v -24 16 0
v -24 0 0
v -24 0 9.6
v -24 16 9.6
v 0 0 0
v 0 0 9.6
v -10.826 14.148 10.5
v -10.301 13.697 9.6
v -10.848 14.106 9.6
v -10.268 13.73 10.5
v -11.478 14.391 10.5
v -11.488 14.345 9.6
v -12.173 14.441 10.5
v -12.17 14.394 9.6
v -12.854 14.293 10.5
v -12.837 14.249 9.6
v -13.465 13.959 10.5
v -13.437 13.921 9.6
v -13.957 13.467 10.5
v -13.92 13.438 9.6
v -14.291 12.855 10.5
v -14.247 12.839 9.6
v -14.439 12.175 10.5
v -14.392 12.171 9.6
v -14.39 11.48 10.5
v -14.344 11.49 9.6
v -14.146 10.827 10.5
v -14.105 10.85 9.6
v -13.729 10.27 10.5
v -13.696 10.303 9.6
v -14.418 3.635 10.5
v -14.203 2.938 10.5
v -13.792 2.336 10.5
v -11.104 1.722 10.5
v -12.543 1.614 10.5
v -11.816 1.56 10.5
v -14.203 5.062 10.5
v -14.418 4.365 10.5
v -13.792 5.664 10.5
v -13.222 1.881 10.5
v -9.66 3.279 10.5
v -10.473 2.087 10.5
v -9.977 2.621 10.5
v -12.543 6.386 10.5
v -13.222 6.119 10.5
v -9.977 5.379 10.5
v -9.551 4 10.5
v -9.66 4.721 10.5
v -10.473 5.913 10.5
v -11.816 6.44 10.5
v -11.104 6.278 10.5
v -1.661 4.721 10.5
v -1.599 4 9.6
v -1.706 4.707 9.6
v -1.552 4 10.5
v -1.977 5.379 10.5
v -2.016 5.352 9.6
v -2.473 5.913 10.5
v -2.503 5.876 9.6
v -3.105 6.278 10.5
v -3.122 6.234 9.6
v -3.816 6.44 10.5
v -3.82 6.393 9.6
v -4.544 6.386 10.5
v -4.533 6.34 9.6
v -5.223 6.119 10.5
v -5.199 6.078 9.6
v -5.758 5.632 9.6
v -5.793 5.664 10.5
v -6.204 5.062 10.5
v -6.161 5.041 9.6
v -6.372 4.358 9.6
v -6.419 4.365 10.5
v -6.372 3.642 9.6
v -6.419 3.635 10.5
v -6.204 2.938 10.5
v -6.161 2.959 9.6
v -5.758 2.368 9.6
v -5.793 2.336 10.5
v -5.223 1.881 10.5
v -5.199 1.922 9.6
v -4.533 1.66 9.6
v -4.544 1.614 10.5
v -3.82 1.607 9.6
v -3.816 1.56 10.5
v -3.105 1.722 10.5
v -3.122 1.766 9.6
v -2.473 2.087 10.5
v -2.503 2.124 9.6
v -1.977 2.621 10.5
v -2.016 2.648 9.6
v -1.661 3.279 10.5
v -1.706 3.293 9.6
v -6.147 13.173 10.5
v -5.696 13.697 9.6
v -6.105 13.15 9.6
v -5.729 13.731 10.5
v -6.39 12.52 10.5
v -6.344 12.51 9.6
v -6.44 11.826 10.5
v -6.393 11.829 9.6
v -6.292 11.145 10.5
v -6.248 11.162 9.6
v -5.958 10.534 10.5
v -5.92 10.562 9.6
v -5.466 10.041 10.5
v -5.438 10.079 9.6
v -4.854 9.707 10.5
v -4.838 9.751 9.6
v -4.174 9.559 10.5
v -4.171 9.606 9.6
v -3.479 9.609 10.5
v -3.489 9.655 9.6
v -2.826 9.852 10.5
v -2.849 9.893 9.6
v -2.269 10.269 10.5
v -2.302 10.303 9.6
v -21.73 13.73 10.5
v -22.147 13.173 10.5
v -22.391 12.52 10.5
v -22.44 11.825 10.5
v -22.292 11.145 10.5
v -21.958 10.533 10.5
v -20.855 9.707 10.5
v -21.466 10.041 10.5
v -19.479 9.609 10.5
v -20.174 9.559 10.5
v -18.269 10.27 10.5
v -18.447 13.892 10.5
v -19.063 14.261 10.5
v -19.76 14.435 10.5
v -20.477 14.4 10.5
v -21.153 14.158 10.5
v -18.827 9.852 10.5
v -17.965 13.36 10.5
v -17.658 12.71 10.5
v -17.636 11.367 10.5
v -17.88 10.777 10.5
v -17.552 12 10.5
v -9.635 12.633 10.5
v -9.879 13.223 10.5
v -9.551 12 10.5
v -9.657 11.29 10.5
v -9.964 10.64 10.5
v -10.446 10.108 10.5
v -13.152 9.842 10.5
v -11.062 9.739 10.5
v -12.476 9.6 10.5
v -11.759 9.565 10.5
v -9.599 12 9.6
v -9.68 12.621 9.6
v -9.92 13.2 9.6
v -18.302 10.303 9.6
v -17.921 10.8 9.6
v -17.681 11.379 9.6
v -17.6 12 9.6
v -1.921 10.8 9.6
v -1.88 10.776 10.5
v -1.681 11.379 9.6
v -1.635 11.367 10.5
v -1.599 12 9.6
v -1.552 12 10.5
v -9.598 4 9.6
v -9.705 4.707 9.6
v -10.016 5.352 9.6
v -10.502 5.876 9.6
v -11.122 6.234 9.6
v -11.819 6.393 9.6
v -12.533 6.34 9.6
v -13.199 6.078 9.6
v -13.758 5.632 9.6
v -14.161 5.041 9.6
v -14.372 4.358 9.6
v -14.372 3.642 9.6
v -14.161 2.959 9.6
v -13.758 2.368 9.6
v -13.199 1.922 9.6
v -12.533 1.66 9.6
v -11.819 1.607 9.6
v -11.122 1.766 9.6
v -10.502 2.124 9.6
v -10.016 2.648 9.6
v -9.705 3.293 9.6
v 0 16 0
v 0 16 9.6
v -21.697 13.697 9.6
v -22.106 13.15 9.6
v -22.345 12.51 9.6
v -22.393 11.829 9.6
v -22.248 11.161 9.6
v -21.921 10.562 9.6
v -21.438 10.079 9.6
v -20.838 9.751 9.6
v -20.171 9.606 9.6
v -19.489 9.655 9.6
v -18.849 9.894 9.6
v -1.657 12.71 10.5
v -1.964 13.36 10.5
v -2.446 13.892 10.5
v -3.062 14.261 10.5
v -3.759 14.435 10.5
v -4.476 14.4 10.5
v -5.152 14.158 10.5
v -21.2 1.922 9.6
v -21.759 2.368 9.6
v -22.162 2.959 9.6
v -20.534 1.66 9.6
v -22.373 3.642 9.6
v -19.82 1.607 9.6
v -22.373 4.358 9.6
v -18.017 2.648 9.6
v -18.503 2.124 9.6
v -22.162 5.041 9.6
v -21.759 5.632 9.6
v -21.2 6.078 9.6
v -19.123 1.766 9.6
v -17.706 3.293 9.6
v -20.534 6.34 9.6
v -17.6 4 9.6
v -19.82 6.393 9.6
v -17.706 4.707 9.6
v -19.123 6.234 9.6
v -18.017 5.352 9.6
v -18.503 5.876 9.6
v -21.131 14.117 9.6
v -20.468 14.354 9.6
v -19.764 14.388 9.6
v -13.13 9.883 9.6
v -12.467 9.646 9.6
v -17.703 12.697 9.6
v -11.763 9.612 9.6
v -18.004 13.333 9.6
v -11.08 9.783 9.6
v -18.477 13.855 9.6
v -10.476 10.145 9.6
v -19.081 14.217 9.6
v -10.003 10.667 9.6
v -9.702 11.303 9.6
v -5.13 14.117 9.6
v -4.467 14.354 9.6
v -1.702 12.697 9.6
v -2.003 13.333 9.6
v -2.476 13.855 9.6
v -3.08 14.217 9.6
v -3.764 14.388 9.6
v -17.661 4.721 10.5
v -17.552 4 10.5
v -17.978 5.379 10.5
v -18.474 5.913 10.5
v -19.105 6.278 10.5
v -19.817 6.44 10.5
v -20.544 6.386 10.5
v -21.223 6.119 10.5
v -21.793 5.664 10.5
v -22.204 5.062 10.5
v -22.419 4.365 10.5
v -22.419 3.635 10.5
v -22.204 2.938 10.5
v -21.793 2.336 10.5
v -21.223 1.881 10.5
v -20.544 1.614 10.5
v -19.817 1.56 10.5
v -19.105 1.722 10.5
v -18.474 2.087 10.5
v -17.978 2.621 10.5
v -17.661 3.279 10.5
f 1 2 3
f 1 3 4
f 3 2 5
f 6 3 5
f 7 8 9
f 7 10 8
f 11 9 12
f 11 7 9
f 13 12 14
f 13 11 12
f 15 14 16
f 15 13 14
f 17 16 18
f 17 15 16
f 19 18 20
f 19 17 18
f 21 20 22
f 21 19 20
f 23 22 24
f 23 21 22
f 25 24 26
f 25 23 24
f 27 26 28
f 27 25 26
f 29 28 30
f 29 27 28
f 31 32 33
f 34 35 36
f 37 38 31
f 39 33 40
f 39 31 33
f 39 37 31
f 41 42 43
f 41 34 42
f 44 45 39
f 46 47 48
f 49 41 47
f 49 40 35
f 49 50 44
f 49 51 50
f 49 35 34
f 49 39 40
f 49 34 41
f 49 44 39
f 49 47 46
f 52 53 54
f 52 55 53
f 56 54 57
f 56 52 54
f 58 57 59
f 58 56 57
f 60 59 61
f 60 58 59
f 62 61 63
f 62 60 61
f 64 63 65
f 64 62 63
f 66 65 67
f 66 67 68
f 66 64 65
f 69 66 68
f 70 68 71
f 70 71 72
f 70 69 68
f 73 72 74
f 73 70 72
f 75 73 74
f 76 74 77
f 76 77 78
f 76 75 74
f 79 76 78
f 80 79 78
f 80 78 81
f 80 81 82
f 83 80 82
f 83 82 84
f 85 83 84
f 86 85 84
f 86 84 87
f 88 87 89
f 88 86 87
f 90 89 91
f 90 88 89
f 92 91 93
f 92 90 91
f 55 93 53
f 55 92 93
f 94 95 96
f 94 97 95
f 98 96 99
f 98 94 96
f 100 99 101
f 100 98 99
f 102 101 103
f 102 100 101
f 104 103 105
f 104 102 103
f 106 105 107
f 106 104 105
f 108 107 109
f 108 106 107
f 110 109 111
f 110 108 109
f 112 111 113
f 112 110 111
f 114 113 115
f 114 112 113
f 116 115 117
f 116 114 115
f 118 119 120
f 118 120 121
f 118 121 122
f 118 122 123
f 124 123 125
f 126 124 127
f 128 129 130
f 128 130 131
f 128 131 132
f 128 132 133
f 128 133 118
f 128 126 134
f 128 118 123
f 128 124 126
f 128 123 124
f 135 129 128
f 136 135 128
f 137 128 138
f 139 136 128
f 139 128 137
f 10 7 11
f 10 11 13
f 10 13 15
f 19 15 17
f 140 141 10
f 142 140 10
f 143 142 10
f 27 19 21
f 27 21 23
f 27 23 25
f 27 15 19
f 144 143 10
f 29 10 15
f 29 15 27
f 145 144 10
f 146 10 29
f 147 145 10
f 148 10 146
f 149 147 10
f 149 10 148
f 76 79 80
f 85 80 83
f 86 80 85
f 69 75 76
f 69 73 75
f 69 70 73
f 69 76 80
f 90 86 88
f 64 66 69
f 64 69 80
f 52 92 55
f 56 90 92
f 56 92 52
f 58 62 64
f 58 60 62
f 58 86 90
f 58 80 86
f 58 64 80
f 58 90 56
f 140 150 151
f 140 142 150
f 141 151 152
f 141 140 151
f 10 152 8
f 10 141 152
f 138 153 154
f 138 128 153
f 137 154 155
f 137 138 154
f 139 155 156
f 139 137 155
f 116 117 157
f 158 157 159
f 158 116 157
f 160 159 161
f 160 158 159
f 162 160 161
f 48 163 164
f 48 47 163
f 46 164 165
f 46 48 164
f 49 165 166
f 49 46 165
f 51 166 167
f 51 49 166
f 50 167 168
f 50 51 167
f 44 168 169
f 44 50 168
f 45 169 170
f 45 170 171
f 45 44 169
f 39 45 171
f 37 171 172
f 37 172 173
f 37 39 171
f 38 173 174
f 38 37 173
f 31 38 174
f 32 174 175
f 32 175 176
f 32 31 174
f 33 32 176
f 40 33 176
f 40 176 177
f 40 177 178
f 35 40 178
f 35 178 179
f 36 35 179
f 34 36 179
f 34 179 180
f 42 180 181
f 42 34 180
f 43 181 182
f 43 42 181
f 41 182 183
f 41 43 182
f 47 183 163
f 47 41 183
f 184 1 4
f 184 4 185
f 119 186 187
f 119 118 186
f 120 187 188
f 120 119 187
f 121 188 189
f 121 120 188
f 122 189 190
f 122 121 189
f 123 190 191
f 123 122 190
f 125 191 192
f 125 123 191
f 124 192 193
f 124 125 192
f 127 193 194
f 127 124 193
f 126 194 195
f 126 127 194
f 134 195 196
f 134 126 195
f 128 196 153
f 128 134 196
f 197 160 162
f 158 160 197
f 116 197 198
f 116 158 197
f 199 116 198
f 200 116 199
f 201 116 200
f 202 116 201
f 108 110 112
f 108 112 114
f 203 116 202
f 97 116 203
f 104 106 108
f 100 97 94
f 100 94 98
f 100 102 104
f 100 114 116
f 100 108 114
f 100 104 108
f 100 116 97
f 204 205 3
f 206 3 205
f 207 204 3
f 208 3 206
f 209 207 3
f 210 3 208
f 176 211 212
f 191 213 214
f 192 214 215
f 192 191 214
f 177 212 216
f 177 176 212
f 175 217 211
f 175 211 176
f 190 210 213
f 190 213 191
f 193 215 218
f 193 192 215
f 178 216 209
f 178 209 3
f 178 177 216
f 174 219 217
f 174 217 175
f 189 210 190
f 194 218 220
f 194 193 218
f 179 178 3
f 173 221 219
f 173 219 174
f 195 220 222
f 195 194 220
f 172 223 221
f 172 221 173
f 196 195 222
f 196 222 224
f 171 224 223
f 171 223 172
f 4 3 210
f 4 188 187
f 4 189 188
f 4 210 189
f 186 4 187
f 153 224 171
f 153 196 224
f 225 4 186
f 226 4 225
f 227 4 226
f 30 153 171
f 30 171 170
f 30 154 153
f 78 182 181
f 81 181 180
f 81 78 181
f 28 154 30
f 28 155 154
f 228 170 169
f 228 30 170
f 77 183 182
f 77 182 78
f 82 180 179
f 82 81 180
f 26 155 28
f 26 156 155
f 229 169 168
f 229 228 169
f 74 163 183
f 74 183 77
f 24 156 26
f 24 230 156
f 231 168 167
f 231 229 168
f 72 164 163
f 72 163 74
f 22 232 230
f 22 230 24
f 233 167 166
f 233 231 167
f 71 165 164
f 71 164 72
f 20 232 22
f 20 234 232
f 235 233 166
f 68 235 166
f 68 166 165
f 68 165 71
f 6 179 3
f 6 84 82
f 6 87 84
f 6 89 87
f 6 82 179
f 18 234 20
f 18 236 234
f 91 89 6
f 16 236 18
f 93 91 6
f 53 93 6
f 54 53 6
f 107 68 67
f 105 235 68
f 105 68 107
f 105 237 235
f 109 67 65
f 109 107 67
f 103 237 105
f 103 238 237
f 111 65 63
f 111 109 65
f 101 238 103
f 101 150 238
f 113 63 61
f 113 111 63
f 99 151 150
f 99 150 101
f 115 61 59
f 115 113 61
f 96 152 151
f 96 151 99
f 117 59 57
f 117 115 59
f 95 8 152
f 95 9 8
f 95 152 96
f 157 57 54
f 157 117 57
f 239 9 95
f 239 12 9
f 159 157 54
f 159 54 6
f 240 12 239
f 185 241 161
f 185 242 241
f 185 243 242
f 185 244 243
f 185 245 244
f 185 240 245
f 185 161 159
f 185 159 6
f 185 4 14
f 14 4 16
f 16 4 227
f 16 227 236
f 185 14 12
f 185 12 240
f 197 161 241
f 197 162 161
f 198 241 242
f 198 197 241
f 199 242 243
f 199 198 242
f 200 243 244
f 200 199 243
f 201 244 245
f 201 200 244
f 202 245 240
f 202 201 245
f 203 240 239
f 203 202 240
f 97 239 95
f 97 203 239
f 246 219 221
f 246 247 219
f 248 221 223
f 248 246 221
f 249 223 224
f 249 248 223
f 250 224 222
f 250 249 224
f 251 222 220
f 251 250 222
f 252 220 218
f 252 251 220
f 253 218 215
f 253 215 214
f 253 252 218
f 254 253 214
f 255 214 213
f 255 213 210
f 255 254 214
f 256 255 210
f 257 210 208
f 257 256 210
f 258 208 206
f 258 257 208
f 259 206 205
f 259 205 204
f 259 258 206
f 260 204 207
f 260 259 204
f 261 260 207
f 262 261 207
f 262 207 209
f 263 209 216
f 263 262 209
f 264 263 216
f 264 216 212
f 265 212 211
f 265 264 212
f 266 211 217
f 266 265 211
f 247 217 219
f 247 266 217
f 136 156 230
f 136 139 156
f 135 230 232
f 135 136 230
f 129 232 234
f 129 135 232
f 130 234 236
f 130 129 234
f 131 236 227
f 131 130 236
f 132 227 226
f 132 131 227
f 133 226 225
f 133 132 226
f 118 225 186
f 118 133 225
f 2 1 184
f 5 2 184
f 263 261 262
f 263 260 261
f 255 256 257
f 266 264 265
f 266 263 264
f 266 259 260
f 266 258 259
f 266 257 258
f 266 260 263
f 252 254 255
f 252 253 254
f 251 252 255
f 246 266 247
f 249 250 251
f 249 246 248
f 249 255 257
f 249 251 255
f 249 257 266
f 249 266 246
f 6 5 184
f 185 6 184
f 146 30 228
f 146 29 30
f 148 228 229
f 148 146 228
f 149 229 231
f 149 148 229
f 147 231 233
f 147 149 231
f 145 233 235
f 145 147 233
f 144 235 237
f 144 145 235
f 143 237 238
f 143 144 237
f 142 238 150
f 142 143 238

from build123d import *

# Parameters (mm, degrees)
F0_W     = 24
F0_H     = 16
F1_DEPTH = 9.6
F2_R     = 2.4
F3_DEPTH = 0.9
F3_TAPER = -3


with BuildPart() as f1:
    # F0 (on Top) → F1 (new body)
    with BuildSketch(Plane.XY):
        with Locations((-12, 8)):
            Rectangle(F0_W, F0_H)
    extrude(amount=F1_DEPTH)

    # F2 (on face) → F3 (join, symmetric)
    with BuildSketch(Plane.XY.offset(9.6)):
        with Locations((-19.9995, 4)):
            Circle(F2_R)
        with Locations((-11.9985, 4)):
            Circle(F2_R)
        with Locations((-3.999, 4)):
            Circle(F2_R)
        with BuildLine():
            ThreePointArc((-5.695844103, 13.6972684201), (-5.6962684201, 10.303155897), (-2.302155897, 10.3027315799))
            Line((-2.302155897, 10.3027315799), (-5.695844103, 13.6972684201))
        make_face()
        with BuildLine():
            Line((-5.695844103, 13.6972684201), (-2.302155897, 10.3027315799))
            ThreePointArc((-2.302155897, 10.3027315799), (-1.781746536, 11.0814211649), (-1.599, 12))
            ThreePointArc((-1.599, 12), (-3.0804211649, 14.217253464), (-5.695844103, 13.6972684201))
        make_face()
        with BuildLine():
            Line((-21.6966623309, 13.6969502121), (-18.3023376691, 10.3030497879))
            ThreePointArc((-18.3023376691, 10.3030497879), (-17.7821604236, 11.0816290494), (-17.5995, 12))
            ThreePointArc((-17.5995, 12), (-19.0811290494, 14.2173395764), (-21.6966623309, 13.6969502121))
        make_face()
        with BuildLine():
            ThreePointArc((-21.6966623309, 13.6969502121), (-21.6964502121, 10.3028376691), (-18.3023376691, 10.3030497879))
            Line((-18.3023376691, 10.3030497879), (-21.6966623309, 13.6969502121))
        make_face()
        with BuildLine():
            Line((-10.3013376691, 13.6969502121), (-13.6956623309, 10.3030497879))
            ThreePointArc((-13.6956623309, 10.3030497879), (-11.0801290494, 9.7826604236), (-9.5985, 12))
            ThreePointArc((-9.5985, 12), (-9.7811604236, 12.9183709506), (-10.3013376691, 13.6969502121))
        make_face()
        with BuildLine():
            ThreePointArc((-10.3013376691, 13.6969502121), (-13.6954502121, 13.6971623309), (-13.6956623309, 10.3030497879))
            Line((-13.6956623309, 10.3030497879), (-10.3013376691, 13.6969502121))
        make_face()
    extrude(amount=F3_DEPTH, both=True, taper=F3_TAPER)


solid = f1.part
